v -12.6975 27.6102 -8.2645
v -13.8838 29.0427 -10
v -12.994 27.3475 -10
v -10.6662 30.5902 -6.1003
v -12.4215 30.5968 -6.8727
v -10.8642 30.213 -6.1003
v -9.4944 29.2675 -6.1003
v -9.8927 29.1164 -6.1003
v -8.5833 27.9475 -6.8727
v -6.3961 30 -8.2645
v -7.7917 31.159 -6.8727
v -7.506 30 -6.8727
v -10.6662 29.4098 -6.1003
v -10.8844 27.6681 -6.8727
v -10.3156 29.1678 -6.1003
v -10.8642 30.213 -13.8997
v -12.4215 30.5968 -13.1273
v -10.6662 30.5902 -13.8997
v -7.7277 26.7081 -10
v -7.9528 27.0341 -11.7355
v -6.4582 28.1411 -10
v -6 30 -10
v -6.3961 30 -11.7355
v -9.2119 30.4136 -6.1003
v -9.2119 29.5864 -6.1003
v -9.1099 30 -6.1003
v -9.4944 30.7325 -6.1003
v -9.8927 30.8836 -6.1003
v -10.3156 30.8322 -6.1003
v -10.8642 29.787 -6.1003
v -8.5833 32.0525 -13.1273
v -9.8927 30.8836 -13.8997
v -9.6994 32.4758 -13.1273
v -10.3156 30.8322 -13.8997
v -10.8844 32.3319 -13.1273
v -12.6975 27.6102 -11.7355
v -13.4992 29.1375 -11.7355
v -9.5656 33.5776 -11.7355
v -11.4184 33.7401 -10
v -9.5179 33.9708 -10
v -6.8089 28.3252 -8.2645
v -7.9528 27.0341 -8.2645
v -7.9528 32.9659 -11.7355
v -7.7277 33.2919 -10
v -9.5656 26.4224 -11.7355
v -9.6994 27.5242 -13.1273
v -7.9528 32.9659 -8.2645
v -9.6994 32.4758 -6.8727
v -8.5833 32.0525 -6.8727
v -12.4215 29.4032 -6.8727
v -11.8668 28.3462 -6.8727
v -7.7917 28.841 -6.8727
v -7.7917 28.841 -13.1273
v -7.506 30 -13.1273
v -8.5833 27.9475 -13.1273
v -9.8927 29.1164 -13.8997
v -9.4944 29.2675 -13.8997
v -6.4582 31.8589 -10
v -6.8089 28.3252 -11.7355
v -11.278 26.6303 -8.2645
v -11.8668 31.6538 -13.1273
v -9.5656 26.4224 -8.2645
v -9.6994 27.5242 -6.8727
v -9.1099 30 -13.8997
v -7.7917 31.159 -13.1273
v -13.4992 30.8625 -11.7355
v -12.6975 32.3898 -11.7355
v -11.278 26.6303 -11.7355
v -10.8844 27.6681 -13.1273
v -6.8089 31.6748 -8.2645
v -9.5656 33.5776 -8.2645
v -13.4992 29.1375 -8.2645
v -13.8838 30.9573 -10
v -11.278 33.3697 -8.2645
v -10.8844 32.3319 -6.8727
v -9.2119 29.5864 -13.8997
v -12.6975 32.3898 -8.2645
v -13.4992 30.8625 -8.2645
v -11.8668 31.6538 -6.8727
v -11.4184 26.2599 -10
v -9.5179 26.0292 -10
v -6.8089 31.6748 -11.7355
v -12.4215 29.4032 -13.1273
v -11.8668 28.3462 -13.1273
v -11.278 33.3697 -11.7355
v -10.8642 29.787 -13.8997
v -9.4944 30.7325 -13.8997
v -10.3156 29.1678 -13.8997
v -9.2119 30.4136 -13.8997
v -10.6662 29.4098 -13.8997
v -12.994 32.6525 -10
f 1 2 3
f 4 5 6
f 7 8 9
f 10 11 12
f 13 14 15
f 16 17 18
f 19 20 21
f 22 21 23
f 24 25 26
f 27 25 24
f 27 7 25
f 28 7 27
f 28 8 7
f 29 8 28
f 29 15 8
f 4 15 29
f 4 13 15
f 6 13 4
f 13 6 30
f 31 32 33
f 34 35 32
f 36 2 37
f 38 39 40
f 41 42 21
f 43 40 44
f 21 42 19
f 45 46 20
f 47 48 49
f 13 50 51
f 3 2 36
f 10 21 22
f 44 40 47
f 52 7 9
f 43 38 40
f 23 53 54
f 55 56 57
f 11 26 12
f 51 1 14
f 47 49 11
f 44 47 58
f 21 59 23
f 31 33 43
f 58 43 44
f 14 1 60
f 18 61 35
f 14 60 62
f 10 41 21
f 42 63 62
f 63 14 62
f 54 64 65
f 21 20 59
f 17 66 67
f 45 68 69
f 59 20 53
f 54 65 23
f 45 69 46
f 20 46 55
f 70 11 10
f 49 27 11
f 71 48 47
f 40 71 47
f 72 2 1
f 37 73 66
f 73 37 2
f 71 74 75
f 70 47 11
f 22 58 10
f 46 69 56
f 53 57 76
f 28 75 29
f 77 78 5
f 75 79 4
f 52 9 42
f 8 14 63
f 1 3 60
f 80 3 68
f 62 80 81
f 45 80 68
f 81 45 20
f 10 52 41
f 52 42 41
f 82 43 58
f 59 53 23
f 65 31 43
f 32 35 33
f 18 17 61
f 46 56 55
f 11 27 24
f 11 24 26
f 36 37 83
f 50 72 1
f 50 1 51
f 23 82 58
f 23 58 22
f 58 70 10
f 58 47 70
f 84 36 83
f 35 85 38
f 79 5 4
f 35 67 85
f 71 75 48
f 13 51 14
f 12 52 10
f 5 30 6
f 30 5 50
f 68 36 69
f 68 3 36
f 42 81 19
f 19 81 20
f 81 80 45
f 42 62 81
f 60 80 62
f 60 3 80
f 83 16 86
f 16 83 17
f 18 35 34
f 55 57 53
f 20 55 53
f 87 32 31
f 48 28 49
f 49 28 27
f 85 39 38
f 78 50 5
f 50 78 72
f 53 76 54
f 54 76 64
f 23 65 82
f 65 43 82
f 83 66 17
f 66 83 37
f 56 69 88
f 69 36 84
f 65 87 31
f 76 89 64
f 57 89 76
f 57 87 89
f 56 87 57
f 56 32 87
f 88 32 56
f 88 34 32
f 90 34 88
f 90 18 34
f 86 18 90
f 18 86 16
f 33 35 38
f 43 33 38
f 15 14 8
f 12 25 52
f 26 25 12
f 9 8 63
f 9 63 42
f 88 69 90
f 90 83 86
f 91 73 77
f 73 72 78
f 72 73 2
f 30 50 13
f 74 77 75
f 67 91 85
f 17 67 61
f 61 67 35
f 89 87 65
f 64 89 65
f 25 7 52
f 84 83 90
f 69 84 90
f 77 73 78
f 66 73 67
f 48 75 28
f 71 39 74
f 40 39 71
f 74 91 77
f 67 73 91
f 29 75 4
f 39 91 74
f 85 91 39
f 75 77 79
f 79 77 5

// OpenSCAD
// Generated by generate_scads.py
difference() {
  translate([-10,30,-10]) {
    sphere(r=4);
  }
  cube(size=[25,20,5], center=false);
  difference() {
    sphere(r=12);
    sphere(r=6);
  }
  cylinder(h=15, r=12, center=false);
}
